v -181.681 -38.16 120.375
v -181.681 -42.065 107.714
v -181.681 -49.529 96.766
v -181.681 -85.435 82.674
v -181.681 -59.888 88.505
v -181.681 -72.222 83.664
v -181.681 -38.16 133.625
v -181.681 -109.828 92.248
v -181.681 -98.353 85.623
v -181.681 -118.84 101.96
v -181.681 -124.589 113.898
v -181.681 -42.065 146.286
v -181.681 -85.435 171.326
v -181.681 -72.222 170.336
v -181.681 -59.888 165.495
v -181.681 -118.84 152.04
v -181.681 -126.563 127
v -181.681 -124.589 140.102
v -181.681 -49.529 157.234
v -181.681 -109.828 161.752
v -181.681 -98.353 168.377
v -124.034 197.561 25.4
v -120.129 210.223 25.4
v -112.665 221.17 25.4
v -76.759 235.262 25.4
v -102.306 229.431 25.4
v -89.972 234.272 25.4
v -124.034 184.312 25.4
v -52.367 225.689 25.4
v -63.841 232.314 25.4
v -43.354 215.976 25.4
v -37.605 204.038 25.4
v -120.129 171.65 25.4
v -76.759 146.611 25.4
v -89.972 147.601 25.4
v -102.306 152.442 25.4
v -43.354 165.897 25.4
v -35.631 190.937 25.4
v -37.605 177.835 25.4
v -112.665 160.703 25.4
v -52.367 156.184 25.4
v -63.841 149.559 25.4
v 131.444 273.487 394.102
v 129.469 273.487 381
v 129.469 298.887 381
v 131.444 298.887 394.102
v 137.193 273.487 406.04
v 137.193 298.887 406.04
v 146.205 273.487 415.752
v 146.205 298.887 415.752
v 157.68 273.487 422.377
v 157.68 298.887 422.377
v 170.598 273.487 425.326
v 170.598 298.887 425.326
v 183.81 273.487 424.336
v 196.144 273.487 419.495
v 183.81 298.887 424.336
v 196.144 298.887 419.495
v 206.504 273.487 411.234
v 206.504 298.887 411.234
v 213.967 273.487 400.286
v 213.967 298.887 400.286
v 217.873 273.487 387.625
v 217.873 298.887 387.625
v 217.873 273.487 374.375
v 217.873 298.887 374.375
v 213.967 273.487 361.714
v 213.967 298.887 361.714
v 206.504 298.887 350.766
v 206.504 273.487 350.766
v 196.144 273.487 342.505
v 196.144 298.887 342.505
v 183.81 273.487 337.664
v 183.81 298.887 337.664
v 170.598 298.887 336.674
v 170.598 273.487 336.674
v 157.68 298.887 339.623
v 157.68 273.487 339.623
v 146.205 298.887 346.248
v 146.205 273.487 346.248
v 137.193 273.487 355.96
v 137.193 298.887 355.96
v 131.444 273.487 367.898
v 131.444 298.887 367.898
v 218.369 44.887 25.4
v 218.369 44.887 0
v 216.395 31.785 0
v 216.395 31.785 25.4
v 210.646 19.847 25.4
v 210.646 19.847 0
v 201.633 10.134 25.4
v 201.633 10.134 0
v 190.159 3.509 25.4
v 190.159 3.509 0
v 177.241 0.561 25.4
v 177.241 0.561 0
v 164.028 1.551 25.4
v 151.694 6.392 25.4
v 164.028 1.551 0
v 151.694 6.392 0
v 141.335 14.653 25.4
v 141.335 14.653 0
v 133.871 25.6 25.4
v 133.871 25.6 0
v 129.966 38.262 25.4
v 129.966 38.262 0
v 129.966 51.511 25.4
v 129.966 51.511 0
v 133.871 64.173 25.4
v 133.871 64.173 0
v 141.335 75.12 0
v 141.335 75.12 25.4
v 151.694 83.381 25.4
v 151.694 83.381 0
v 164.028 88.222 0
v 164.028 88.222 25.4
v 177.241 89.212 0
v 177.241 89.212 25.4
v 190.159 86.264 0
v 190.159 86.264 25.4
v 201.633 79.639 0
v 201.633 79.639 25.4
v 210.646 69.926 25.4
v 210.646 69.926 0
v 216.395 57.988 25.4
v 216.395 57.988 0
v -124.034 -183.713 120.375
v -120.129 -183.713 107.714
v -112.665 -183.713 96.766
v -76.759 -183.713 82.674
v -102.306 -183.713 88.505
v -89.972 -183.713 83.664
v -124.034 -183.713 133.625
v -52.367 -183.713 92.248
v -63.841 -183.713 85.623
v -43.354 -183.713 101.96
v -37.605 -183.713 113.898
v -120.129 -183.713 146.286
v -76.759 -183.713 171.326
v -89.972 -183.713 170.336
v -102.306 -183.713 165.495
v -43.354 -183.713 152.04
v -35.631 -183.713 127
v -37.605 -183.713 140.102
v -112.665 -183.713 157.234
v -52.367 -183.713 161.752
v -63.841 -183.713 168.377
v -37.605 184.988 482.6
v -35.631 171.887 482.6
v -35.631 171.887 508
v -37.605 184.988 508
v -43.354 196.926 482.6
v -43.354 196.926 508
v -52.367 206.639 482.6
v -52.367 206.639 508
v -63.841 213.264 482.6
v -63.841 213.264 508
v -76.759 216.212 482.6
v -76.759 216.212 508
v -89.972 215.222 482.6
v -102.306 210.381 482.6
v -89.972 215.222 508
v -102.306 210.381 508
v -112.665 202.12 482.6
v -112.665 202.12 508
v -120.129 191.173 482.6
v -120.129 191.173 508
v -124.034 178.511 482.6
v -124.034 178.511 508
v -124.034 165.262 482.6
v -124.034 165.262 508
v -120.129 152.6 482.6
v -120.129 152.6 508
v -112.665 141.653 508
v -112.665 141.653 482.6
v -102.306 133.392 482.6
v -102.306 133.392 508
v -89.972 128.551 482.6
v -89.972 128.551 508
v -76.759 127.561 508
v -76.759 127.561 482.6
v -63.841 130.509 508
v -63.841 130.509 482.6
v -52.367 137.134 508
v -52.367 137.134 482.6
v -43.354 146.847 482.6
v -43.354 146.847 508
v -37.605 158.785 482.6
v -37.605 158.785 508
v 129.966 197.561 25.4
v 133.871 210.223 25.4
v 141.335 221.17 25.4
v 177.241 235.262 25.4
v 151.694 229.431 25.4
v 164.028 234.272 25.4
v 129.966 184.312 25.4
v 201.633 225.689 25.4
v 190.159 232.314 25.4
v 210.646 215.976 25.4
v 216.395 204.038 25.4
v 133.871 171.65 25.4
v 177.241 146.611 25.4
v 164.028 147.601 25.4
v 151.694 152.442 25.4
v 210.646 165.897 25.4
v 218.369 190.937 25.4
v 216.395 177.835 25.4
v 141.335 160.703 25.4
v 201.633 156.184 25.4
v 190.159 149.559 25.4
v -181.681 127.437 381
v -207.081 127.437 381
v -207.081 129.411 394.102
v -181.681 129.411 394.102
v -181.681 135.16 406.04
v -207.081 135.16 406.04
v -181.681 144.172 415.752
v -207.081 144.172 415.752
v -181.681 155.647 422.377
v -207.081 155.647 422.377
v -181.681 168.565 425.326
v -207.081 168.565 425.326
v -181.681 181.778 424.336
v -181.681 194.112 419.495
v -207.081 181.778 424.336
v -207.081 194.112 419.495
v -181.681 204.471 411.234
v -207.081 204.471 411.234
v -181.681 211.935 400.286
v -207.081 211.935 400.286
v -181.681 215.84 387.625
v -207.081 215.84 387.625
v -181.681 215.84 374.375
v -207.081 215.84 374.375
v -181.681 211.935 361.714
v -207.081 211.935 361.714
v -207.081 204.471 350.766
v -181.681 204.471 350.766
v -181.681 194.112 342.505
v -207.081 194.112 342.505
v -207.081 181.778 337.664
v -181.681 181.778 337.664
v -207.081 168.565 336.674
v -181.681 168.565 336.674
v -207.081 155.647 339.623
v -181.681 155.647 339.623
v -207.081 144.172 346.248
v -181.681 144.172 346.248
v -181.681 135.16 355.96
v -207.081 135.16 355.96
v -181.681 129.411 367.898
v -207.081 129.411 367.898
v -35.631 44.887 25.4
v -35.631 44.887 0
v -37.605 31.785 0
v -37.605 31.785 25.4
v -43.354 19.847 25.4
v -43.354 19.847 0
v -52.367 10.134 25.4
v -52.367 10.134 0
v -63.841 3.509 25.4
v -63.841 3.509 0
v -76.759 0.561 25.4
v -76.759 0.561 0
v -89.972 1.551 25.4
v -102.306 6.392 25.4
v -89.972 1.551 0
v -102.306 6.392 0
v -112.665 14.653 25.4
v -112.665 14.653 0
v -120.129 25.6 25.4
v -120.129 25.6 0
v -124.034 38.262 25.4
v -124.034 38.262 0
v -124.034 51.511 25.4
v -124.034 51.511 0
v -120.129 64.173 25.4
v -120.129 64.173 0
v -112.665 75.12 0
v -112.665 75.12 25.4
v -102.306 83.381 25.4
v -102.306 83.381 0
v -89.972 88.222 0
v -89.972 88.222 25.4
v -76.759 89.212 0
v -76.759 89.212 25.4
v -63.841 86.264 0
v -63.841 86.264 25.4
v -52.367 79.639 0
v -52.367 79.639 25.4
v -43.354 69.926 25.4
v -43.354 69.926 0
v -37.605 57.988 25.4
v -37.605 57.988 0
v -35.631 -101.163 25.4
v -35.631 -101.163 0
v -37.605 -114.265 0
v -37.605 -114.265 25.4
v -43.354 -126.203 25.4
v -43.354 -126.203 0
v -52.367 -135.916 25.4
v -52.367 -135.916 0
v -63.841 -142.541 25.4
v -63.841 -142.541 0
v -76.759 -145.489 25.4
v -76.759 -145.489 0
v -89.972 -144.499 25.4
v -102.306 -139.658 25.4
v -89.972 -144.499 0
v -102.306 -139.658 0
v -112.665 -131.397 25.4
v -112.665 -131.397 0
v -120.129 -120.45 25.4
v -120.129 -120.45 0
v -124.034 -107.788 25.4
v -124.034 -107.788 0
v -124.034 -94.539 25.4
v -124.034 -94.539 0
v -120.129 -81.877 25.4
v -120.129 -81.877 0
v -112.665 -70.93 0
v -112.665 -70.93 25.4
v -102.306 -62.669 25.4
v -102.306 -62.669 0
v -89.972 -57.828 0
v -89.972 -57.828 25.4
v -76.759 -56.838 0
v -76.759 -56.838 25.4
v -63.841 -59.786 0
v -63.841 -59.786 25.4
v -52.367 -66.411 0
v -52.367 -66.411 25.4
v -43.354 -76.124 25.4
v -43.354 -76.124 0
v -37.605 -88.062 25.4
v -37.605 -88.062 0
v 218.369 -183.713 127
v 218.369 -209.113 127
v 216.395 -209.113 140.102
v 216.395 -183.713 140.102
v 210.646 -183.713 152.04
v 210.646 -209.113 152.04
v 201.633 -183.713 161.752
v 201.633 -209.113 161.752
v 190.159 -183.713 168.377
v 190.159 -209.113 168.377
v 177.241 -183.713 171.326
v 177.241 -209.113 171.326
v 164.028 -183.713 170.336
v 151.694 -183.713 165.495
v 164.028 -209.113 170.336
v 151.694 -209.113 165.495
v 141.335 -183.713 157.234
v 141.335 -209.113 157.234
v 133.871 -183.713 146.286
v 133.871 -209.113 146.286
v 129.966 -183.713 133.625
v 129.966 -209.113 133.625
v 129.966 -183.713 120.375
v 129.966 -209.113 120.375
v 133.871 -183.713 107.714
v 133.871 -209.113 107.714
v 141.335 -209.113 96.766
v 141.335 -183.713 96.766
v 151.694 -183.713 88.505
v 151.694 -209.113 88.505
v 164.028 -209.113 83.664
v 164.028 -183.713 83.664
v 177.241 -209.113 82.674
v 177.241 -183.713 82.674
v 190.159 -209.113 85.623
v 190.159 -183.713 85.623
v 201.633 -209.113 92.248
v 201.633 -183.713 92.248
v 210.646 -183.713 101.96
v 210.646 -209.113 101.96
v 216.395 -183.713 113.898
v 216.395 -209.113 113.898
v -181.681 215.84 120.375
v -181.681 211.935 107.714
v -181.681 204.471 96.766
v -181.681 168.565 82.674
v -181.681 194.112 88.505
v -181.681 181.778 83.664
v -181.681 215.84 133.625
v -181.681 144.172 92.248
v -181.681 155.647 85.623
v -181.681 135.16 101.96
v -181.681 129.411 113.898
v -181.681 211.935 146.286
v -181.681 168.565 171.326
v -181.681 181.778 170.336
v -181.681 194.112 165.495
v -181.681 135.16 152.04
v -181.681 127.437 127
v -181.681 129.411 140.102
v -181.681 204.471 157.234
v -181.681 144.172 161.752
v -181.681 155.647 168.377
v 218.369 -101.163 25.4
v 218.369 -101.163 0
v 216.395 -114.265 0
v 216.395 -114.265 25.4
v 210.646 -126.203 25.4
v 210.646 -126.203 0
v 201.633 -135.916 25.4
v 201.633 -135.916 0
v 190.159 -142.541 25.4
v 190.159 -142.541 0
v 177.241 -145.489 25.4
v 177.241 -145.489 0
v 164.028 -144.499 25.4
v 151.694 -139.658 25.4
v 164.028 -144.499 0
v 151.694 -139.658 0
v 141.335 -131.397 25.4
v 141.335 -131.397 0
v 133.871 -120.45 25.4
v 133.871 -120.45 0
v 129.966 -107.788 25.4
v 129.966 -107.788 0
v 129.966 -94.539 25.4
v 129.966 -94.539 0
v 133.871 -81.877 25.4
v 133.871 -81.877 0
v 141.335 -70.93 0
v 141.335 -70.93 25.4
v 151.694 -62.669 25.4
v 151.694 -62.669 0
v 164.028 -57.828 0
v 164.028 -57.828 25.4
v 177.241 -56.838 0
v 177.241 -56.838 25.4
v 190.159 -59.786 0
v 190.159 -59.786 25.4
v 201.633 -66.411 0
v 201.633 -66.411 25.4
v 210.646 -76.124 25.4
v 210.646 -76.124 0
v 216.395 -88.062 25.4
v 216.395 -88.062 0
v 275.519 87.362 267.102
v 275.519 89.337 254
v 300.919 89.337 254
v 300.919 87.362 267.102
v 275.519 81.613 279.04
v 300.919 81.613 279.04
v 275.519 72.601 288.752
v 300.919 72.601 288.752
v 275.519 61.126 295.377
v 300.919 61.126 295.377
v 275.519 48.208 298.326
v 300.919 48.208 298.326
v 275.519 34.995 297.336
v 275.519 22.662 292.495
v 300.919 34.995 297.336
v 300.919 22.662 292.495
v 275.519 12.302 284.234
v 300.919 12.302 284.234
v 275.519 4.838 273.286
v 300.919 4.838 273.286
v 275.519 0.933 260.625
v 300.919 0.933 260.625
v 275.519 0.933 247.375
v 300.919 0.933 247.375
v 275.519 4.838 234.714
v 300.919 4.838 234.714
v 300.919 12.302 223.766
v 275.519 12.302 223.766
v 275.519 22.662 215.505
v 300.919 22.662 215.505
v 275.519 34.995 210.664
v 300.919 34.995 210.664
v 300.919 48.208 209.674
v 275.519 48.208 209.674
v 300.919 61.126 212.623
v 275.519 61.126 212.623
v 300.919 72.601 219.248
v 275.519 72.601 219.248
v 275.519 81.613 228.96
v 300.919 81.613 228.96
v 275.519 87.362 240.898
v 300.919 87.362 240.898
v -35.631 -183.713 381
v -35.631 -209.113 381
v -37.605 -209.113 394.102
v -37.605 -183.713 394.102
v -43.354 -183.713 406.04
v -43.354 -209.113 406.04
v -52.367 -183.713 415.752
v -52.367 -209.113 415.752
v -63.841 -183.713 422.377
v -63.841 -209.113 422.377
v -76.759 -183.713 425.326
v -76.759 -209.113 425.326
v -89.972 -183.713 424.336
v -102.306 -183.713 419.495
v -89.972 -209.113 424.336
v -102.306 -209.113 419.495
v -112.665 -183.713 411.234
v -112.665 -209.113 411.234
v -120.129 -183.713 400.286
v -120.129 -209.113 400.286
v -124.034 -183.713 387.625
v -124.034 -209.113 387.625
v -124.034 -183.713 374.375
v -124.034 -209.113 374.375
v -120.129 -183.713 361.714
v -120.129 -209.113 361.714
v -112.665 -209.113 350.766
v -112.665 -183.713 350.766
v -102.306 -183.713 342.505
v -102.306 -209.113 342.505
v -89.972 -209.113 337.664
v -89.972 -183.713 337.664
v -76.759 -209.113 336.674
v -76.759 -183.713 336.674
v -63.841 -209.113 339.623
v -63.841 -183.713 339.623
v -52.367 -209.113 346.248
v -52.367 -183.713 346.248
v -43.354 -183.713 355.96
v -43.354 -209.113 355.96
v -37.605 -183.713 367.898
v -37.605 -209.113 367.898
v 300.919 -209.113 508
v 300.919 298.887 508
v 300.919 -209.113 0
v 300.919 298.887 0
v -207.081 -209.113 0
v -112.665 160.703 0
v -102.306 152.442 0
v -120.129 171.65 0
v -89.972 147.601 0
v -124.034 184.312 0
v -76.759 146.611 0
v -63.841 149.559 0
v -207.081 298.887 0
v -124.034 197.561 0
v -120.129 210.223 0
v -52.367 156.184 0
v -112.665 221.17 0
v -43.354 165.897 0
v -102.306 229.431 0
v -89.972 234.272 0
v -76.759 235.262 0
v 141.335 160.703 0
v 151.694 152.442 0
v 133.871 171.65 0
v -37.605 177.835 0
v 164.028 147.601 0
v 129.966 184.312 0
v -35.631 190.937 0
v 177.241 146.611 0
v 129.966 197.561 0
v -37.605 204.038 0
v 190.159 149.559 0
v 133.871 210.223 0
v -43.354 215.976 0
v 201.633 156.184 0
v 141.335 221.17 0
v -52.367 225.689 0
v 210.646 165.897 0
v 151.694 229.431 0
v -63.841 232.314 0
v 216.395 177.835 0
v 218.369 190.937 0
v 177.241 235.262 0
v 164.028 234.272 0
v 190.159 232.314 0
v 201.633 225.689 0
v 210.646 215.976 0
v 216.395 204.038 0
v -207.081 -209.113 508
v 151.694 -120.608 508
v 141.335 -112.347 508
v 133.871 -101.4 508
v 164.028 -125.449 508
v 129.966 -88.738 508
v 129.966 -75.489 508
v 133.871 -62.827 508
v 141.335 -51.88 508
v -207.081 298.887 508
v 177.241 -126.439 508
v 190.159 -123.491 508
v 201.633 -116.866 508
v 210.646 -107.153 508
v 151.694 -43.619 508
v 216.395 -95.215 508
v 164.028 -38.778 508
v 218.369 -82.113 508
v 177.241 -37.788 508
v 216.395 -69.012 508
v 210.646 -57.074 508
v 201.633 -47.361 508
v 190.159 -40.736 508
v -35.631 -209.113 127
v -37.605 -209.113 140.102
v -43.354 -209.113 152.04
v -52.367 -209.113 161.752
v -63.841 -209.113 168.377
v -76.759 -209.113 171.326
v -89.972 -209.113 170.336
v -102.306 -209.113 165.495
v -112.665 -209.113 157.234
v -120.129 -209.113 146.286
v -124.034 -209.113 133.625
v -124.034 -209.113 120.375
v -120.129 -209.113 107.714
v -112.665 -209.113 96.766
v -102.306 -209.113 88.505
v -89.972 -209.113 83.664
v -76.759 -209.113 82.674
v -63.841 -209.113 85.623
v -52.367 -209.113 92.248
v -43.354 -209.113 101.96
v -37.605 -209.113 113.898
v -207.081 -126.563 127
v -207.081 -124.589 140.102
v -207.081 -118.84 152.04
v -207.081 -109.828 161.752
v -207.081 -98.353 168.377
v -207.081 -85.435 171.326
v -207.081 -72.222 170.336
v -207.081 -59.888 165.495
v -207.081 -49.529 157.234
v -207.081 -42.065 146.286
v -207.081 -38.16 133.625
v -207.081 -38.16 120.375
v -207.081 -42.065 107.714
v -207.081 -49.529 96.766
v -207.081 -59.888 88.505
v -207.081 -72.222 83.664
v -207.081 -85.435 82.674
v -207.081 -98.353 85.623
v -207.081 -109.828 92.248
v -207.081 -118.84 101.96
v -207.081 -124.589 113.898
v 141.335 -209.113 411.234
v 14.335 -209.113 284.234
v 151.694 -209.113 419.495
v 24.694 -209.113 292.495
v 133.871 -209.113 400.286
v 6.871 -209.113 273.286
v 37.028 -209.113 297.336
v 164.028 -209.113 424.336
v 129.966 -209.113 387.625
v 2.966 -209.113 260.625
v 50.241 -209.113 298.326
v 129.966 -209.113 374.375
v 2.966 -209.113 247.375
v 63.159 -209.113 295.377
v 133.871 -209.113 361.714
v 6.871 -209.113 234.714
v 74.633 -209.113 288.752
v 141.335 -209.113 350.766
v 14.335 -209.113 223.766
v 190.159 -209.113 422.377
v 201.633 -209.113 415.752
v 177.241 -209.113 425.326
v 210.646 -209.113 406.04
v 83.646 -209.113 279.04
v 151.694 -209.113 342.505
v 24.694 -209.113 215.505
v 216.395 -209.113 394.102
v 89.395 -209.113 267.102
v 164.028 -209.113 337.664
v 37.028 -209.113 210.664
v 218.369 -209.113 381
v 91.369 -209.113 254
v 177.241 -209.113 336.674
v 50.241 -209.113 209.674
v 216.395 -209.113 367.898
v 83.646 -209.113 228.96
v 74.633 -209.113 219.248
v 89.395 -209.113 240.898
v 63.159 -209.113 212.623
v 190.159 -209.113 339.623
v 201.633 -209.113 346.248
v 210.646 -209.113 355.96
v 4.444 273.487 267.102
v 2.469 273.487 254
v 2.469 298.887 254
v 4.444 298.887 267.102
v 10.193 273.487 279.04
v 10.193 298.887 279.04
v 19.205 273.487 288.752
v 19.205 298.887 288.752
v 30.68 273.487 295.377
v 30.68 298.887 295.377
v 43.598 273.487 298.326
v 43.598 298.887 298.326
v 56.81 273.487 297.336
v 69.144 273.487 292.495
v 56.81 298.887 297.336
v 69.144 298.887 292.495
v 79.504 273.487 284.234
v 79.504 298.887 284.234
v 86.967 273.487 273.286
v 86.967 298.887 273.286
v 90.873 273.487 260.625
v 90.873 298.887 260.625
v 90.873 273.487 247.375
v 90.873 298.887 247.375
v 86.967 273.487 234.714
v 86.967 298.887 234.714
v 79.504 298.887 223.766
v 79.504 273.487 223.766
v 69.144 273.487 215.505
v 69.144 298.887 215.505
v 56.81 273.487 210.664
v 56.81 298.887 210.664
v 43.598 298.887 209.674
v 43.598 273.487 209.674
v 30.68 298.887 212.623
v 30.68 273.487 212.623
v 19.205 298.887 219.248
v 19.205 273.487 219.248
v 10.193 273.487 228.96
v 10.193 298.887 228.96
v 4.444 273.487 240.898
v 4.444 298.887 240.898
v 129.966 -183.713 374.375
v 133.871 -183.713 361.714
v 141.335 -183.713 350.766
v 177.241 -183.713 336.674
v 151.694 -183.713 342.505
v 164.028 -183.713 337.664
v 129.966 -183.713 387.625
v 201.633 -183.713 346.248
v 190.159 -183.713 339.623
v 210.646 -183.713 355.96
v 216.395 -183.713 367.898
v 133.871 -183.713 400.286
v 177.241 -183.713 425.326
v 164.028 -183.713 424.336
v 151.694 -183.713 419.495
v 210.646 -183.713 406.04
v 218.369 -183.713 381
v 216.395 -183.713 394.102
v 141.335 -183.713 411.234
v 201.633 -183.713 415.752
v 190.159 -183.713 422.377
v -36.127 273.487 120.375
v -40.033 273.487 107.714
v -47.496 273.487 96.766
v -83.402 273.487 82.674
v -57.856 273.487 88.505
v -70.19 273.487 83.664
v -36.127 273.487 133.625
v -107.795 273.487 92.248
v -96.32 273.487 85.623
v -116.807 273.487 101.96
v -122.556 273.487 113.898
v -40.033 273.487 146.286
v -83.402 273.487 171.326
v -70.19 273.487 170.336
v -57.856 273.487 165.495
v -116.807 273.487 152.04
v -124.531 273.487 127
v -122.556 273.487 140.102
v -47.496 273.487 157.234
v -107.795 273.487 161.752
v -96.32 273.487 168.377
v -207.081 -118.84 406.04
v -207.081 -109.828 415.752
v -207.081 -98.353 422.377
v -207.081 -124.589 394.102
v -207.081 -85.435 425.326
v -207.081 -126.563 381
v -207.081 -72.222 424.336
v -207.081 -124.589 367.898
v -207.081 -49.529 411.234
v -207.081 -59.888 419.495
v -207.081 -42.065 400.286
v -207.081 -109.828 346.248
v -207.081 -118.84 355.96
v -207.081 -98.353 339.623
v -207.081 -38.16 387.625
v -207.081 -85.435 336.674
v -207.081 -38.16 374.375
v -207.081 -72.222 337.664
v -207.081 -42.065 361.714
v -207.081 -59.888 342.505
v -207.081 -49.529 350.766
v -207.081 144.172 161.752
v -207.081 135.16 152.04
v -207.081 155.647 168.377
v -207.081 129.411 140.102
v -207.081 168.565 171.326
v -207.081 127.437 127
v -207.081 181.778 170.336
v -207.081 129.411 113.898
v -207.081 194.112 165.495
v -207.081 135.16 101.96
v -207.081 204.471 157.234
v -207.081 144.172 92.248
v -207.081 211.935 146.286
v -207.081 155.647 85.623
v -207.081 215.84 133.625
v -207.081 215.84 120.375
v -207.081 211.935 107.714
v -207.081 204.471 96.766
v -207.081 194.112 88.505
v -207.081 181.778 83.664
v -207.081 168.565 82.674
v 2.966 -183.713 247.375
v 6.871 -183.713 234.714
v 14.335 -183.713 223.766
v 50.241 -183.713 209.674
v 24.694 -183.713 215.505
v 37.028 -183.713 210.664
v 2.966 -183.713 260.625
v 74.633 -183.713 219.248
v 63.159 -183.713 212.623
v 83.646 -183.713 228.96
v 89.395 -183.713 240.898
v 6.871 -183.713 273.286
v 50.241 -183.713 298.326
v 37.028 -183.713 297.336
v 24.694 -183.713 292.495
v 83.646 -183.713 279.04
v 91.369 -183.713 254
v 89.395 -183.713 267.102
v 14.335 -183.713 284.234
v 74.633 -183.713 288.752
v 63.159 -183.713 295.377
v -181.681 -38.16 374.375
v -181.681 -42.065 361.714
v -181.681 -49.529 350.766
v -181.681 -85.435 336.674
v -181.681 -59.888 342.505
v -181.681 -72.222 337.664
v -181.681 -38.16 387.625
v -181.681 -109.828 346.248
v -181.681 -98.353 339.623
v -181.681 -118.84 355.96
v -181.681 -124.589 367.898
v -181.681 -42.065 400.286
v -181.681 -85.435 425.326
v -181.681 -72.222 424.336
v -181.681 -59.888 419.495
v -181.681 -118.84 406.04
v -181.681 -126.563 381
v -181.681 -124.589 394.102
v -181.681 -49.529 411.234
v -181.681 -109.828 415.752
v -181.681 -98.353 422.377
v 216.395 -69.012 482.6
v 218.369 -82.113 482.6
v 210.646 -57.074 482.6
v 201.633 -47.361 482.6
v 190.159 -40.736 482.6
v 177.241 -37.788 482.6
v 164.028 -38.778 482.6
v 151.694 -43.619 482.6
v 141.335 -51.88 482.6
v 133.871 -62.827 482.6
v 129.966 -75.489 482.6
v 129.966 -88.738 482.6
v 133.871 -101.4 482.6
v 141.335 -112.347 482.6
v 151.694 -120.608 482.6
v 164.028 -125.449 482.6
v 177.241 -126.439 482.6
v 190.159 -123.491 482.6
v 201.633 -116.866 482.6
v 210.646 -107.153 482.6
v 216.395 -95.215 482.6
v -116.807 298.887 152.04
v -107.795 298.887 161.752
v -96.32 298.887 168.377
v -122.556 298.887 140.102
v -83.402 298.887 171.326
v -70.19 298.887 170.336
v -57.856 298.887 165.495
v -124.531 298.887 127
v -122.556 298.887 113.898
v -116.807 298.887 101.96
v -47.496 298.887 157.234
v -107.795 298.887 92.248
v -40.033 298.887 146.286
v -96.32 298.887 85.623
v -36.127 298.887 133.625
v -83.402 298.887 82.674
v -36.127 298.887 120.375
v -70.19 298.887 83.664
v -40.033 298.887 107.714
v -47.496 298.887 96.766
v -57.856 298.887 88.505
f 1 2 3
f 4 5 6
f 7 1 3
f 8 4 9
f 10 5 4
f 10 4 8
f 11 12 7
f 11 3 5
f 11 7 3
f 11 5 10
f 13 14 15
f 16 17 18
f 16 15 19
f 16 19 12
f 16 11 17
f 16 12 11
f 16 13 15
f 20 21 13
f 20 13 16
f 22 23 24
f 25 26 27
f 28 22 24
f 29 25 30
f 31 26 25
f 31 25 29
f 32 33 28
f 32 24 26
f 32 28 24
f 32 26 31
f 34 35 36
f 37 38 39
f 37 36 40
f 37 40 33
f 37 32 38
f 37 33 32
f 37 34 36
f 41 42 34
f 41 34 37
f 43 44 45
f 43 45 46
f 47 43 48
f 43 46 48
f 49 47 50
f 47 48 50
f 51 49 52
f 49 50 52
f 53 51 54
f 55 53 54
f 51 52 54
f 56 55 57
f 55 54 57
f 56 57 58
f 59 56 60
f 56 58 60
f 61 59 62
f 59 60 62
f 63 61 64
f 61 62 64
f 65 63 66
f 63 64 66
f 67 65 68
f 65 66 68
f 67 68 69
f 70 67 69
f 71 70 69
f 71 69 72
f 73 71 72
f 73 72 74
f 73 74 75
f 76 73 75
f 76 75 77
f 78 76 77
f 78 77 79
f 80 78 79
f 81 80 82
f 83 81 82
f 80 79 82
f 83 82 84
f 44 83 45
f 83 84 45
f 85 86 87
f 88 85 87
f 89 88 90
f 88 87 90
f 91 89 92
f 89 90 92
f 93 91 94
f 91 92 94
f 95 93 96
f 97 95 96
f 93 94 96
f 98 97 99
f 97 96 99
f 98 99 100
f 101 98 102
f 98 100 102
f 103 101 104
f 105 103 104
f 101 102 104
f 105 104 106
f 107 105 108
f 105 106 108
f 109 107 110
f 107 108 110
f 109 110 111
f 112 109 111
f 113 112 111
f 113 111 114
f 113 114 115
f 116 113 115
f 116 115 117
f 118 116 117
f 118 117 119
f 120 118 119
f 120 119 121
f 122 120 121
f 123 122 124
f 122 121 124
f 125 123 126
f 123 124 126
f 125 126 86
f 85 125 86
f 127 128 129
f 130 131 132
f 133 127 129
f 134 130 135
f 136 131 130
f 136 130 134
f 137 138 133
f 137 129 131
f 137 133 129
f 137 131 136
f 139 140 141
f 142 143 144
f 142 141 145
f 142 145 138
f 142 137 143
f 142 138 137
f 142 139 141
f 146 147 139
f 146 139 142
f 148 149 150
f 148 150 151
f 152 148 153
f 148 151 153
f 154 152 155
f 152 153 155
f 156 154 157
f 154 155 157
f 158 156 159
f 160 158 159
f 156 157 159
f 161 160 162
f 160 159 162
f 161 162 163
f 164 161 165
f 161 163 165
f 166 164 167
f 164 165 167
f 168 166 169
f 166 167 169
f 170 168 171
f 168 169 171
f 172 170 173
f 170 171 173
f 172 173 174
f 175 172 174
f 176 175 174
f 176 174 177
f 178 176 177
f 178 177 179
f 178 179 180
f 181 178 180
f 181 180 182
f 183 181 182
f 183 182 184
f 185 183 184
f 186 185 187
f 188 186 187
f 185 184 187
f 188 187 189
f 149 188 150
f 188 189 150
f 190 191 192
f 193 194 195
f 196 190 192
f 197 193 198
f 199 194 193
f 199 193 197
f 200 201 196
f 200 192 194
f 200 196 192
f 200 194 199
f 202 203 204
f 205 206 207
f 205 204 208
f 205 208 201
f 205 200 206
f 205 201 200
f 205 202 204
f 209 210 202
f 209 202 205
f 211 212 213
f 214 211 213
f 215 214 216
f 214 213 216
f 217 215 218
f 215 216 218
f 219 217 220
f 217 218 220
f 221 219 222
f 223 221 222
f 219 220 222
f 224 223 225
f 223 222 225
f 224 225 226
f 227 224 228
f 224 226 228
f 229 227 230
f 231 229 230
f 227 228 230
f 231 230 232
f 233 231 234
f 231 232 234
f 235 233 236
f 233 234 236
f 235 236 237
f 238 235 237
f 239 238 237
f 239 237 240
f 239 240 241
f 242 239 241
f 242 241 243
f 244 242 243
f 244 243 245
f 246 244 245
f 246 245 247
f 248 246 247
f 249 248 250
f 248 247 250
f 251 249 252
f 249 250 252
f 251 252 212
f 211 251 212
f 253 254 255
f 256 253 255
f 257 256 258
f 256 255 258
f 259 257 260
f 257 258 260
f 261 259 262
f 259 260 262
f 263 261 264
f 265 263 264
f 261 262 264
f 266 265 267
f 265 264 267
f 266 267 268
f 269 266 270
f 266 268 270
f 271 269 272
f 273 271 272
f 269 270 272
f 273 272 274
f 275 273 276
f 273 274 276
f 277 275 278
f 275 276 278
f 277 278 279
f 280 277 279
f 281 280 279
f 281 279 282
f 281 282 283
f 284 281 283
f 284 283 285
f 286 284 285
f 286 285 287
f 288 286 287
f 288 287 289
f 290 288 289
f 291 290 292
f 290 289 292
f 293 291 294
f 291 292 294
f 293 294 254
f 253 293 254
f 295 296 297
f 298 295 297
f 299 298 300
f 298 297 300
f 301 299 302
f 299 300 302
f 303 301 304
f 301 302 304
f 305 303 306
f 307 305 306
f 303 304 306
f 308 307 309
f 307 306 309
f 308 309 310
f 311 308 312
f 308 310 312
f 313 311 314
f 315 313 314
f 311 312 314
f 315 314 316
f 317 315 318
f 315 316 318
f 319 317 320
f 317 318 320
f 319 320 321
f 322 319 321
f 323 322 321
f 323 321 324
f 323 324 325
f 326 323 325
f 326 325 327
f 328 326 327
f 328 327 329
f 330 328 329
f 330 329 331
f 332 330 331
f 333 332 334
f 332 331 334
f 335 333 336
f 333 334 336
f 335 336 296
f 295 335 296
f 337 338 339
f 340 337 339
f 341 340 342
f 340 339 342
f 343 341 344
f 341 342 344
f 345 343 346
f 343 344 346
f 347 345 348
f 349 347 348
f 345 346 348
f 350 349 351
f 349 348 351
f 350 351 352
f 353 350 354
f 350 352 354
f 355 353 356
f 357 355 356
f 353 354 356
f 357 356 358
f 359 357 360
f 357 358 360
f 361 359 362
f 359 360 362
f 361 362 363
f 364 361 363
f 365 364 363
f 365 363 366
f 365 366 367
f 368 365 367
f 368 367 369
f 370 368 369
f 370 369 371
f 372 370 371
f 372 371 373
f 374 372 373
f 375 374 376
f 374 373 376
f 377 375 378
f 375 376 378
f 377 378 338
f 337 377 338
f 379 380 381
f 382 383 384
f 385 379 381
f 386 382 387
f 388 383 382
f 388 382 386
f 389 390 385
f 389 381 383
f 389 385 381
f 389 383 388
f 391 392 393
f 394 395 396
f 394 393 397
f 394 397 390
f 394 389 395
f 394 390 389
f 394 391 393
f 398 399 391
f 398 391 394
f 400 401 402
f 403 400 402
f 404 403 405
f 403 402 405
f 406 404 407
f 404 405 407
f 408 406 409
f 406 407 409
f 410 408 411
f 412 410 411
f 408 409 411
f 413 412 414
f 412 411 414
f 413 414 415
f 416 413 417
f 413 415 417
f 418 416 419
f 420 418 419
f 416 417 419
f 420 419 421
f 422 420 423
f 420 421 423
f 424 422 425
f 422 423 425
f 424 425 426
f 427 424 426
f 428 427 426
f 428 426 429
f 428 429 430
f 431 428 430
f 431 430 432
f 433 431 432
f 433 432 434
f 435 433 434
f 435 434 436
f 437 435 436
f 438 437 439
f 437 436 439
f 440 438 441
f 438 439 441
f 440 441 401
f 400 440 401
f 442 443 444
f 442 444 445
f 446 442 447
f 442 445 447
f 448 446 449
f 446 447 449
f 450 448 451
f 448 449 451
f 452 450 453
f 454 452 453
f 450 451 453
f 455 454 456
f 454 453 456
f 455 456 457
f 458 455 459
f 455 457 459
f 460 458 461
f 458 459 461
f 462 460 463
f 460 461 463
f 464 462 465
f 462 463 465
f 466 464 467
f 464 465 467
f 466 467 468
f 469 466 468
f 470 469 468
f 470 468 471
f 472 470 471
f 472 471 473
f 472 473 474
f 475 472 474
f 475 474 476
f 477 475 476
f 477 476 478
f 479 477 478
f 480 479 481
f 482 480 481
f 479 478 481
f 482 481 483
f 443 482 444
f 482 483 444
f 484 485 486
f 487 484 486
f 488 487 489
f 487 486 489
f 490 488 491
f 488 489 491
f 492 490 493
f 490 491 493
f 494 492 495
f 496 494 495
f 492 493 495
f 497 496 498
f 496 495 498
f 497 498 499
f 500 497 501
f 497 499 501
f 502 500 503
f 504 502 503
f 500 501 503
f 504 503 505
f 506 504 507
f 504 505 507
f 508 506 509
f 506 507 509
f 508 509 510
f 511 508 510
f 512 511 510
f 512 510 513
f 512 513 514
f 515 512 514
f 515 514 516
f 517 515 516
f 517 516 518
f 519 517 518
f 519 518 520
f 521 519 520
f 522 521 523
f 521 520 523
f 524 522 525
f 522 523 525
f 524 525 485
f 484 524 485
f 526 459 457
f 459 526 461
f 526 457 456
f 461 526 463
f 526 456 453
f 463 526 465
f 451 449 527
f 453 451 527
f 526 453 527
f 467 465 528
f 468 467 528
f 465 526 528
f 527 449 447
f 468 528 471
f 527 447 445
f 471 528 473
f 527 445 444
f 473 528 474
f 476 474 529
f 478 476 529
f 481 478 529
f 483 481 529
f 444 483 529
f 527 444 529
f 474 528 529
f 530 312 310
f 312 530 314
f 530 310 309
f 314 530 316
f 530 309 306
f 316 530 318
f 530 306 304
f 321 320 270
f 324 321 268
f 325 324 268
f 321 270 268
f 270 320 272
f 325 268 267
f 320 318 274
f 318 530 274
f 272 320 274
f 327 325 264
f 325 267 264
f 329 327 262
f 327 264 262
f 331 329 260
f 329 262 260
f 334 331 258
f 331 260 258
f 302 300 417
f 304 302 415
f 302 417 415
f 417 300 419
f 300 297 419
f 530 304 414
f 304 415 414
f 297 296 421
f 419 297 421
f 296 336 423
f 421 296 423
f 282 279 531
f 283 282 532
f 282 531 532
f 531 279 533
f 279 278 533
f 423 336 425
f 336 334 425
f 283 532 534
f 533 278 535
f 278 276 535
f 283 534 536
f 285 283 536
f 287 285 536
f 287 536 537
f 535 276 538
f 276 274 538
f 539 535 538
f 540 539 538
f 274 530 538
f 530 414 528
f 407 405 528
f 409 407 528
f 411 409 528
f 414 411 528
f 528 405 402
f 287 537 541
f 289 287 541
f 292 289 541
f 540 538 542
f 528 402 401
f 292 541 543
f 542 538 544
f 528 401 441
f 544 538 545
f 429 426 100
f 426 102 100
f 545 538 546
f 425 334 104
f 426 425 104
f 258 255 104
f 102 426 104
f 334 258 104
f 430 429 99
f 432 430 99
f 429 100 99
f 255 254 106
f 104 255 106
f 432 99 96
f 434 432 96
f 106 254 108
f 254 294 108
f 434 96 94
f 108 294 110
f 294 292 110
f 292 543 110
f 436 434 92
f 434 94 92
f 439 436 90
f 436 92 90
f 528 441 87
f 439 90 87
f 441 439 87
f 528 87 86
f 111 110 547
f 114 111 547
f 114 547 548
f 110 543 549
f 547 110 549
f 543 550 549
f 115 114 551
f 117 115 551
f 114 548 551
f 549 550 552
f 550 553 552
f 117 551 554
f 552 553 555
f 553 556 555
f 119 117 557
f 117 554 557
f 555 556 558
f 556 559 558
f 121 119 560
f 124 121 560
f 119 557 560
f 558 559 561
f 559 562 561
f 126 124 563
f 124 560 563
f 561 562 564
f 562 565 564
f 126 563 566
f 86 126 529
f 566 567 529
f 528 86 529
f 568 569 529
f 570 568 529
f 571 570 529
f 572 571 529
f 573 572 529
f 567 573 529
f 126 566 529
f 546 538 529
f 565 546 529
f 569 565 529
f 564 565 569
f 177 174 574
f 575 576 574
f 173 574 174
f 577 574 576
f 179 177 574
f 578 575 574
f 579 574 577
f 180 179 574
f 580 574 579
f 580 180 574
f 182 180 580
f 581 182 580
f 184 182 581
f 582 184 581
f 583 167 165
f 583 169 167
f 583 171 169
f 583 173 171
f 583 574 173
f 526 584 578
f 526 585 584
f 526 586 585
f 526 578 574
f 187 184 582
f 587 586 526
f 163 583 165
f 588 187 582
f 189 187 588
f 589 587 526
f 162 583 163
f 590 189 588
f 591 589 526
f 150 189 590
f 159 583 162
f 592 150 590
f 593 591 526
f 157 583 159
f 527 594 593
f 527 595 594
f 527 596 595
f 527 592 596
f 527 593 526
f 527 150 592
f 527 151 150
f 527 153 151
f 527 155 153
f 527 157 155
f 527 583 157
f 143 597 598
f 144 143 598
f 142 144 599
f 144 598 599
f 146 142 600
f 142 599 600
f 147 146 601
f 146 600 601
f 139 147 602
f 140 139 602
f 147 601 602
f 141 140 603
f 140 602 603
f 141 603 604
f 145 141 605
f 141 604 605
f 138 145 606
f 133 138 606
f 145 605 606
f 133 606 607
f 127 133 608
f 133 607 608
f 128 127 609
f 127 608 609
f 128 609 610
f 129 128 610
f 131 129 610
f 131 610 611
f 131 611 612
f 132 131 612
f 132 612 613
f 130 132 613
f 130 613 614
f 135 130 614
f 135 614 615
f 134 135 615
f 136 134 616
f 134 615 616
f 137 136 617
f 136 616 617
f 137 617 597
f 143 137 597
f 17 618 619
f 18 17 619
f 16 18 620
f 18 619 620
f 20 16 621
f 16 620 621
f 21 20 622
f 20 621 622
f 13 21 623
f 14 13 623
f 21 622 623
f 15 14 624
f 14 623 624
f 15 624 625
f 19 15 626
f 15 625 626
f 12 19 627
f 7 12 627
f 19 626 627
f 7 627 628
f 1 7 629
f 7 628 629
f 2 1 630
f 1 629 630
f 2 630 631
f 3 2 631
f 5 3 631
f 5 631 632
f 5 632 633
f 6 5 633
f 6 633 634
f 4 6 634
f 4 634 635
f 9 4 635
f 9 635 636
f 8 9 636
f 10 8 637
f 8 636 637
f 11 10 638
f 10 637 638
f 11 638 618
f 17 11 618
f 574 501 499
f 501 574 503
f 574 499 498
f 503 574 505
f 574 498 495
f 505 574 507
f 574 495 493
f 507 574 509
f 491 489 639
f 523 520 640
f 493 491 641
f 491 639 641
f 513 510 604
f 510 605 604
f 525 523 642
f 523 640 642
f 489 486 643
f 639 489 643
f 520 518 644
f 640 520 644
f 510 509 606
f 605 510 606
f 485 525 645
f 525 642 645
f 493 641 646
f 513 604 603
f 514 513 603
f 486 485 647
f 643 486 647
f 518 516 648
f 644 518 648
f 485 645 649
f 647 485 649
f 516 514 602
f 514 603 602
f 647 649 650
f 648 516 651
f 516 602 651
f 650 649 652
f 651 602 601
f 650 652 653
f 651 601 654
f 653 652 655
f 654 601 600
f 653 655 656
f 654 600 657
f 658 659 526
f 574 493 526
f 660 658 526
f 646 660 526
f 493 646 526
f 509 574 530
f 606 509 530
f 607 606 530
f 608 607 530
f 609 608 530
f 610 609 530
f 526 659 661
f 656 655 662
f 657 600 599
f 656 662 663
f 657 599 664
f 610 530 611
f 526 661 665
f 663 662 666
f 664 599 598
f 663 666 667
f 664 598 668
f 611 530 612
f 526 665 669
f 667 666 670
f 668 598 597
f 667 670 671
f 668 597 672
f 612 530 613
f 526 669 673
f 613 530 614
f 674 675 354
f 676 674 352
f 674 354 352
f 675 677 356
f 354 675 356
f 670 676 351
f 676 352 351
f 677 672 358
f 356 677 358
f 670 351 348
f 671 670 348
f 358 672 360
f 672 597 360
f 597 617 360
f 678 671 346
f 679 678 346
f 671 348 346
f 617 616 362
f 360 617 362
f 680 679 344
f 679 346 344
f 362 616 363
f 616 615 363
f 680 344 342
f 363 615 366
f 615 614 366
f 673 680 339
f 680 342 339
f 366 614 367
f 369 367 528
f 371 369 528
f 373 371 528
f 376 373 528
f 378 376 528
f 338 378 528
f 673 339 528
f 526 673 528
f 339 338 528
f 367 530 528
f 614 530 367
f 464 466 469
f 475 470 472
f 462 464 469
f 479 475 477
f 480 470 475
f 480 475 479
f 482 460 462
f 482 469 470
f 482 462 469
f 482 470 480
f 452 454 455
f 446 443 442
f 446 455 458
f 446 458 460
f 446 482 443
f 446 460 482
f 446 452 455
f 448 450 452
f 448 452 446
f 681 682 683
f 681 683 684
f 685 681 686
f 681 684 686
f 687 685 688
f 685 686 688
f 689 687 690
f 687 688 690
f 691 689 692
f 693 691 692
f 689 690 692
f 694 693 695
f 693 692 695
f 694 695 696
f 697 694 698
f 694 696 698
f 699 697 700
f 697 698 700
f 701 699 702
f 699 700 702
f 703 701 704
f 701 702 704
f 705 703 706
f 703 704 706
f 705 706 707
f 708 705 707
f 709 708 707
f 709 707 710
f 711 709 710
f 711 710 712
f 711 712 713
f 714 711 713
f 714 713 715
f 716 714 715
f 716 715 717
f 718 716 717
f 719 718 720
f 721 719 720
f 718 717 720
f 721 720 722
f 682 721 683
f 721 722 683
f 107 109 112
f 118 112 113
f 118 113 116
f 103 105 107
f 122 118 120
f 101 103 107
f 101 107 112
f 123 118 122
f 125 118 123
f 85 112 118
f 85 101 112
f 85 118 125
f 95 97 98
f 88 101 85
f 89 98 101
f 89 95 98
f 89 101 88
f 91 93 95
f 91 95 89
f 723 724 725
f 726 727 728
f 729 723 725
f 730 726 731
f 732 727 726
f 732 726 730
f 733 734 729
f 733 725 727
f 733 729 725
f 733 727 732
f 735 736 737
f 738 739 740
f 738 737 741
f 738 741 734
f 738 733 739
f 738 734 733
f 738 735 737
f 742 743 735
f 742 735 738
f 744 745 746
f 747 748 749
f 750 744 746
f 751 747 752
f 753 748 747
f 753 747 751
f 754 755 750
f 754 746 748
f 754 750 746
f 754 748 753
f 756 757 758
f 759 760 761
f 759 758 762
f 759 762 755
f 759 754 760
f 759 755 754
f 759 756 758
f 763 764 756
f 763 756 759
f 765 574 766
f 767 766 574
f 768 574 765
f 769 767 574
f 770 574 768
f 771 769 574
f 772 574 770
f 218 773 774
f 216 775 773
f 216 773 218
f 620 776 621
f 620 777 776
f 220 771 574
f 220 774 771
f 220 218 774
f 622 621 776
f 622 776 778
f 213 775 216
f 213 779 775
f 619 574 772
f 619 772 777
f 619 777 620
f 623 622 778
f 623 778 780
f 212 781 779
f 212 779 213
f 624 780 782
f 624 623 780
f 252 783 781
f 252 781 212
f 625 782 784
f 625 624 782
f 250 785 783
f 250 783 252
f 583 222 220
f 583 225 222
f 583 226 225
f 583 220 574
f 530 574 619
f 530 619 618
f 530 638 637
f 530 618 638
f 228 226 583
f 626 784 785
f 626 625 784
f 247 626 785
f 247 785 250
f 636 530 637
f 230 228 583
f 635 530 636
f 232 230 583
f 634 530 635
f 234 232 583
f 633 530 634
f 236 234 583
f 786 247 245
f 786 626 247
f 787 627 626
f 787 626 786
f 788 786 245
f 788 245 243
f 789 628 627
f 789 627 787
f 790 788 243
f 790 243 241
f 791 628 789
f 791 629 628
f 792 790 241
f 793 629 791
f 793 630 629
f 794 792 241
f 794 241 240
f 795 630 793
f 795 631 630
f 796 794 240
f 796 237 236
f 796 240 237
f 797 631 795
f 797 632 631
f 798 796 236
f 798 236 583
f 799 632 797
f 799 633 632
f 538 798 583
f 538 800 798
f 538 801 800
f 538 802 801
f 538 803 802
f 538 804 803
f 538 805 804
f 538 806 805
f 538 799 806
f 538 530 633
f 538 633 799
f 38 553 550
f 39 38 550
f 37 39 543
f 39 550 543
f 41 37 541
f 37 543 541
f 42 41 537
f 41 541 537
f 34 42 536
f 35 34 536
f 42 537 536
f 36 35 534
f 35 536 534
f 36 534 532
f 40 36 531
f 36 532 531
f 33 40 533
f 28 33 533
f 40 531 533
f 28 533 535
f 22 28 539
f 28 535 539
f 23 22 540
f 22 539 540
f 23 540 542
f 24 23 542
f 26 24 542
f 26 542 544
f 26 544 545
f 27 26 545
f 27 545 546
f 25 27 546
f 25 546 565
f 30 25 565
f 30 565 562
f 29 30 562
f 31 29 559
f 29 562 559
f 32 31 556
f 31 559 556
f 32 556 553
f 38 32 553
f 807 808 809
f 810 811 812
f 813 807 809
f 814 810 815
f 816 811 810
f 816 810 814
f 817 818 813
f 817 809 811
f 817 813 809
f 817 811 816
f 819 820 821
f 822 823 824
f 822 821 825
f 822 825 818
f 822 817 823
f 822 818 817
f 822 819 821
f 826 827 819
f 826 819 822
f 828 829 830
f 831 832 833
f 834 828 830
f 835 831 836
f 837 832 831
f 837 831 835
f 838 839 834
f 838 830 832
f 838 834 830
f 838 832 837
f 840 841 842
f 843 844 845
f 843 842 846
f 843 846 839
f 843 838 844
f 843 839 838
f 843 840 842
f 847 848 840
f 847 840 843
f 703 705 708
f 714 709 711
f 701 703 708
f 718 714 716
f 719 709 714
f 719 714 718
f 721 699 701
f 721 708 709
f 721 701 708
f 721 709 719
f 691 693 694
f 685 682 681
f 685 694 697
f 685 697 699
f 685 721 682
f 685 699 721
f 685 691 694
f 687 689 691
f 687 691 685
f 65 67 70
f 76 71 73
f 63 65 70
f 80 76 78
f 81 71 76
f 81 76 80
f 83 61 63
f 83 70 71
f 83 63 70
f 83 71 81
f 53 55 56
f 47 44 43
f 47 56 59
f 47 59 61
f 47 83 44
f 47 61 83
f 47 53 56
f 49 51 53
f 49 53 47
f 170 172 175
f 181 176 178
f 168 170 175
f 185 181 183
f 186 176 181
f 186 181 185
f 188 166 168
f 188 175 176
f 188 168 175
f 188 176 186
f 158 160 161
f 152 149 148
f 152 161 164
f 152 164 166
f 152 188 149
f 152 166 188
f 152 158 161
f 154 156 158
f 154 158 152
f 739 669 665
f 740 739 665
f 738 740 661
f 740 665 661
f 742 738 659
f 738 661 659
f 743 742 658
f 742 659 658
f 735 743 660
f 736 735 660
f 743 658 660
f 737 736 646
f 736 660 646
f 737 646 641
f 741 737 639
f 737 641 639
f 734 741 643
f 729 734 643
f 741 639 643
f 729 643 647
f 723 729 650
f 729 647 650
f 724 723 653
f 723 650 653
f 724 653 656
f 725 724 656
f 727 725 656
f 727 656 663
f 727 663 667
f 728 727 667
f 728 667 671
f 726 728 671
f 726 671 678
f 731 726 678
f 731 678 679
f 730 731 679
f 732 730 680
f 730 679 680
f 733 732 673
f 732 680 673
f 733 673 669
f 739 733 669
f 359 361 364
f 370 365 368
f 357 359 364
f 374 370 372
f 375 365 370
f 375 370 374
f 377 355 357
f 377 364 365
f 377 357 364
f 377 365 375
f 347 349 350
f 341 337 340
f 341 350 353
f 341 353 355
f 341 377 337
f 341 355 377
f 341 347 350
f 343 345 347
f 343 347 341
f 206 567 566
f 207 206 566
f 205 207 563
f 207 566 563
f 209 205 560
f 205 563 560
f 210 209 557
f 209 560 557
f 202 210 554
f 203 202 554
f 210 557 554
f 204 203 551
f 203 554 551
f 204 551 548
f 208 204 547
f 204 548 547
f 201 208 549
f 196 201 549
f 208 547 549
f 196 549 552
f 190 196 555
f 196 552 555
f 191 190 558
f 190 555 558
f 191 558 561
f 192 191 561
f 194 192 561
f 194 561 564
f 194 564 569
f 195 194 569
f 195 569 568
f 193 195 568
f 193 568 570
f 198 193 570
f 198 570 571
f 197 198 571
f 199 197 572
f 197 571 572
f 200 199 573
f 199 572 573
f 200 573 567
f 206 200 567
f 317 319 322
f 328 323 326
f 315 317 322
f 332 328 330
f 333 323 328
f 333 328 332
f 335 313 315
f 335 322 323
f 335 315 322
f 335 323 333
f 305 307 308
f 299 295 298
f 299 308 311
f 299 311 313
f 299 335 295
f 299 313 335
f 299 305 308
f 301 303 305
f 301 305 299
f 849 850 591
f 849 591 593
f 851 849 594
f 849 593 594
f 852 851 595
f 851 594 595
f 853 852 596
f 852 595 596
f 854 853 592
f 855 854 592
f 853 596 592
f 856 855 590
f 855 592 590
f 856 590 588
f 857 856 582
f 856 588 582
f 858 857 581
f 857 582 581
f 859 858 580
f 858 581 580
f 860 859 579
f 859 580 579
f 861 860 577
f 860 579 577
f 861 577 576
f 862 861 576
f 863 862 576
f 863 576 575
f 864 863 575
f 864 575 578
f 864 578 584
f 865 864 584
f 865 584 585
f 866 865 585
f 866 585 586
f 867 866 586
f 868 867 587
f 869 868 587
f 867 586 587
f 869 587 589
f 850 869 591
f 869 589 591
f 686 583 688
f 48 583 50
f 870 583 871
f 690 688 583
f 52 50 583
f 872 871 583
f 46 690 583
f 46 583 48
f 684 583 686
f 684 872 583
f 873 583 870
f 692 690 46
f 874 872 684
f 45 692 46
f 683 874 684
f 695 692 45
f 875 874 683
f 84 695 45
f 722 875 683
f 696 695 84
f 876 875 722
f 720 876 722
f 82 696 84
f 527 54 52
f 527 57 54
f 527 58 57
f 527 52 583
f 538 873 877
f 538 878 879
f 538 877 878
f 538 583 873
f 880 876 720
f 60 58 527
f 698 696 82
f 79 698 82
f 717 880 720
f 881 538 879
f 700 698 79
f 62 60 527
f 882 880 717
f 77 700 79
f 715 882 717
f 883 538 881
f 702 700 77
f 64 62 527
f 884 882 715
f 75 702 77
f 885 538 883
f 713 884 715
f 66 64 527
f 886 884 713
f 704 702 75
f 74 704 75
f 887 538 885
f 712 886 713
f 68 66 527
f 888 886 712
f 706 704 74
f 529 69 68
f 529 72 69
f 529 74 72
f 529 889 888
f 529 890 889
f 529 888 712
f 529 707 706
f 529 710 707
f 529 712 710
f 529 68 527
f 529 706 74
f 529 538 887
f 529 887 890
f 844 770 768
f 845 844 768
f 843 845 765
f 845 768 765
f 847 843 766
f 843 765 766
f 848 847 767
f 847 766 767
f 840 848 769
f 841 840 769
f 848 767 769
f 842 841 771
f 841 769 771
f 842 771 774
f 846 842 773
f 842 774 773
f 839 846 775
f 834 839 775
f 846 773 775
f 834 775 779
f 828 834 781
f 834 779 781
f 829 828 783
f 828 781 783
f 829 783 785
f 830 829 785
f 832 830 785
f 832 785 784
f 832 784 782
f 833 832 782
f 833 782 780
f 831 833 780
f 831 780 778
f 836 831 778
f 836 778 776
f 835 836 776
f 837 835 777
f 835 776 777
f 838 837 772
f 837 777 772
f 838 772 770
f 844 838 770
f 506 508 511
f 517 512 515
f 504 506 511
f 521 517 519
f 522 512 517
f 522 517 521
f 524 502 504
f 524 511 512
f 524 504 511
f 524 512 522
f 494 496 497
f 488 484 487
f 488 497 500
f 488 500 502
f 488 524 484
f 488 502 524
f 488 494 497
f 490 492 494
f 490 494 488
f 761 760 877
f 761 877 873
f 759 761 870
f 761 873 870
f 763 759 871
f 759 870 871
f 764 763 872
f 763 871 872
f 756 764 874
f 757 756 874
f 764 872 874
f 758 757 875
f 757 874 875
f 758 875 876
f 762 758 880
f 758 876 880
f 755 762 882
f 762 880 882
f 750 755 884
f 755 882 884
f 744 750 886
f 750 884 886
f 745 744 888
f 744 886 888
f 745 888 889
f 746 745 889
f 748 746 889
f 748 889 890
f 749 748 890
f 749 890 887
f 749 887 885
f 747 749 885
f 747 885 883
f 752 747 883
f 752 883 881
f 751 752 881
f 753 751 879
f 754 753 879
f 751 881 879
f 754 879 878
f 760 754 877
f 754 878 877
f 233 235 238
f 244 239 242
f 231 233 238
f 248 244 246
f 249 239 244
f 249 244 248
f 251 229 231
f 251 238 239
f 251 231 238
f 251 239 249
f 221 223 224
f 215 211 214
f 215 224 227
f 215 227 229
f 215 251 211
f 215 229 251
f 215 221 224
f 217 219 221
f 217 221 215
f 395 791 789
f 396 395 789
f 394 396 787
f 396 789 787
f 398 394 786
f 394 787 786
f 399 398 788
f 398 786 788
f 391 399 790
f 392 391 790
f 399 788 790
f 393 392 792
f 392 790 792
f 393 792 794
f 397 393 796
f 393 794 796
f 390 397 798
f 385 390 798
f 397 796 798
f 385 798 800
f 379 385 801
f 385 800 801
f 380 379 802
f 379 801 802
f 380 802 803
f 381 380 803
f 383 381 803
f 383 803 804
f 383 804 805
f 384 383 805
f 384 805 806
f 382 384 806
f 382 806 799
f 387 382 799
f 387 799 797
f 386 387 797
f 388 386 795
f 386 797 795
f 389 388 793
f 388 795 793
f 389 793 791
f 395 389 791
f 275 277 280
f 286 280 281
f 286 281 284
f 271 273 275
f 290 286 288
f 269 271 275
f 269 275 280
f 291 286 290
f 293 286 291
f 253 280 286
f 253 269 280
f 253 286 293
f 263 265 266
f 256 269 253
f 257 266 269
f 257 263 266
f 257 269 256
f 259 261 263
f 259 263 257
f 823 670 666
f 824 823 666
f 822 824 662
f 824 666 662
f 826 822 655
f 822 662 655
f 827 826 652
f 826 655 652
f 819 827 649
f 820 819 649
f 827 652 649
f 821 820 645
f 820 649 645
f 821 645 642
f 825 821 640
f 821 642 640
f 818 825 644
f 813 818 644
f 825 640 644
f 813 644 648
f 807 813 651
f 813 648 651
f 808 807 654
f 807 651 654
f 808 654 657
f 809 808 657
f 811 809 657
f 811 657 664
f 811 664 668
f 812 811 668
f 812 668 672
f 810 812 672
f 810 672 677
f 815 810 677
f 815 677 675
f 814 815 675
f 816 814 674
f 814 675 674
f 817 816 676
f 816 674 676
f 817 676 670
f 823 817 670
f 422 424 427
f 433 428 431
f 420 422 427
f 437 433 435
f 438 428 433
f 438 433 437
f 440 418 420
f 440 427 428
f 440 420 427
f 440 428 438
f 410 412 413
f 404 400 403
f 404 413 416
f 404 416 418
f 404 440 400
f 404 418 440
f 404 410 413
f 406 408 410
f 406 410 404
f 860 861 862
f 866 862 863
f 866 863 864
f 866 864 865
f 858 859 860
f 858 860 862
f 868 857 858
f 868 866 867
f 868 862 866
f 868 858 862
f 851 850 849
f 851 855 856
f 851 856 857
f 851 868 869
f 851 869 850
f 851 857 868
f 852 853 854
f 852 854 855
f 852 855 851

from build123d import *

# Parameters (mm, degrees)
F0_W      = 508
F0_H      = 508
F1_DEPTH  = 508
F2_R      = 44.45
F3_DEPTH  = 25.4
F4_R      = 44.45
F5_DEPTH  = 25.4
F6_R      = 44.45
F7_DEPTH  = 25.4
F8_R      = 44.45
F9_DEPTH  = 25.4
F10_R     = 44.45
F11_DEPTH = 25.4
F12_R     = 44.45
F13_DEPTH = 25.4


with BuildPart() as f1:
    # F0 (on Top) → F1 (new body)
    with BuildSketch(Plane.XY):
        with Locations((46.919354, 44.886551)):
            Rectangle(F0_W, F0_H)
    extrude(amount=F1_DEPTH)

    # F2 (on face) → F3 (cut)
    with BuildSketch(Plane(origin=(-207.080646, 0, 0), x_dir=(0, -1, 0), z_dir=(-1, 0, 0))):
        with Locations((-171.886551, 127)):
            Circle(F2_R)
        with Locations((-171.886551, 381)):
            Circle(F2_R)
        with Locations((82.113449, 381)):
            Circle(F2_R)
        with Locations((82.113449, 127)):
            Circle(F2_R)
    extrude(amount=-F3_DEPTH, mode=Mode.SUBTRACT)

    # F4 (on face) → F5 (cut)
    with BuildSketch(Plane(origin=(0, 0, 0), x_dir=(1, 0, 0), z_dir=(0, 0, -1))):
        with Locations((-80.080646, 101.163449)):
            Circle(F4_R)
        with Locations((-80.080646, -190.936551)):
            Circle(F4_R)
        with Locations((173.919354, 101.163449)):
            Circle(F4_R)
        with Locations((-80.080646, -44.886551)):
            Circle(F4_R)
        with Locations((173.919354, -44.886551)):
            Circle(F4_R)
        with Locations((173.919354, -190.936551)):
            Circle(F4_R)
    extrude(amount=-F5_DEPTH, mode=Mode.SUBTRACT)

    # F6 (on face) → F7 (cut)
    with BuildSketch(Plane(origin=(0, 298.886551, 0), x_dir=(-1, 0, 0), z_dir=(0, 1, 0))):
        with Locations((80.080646, 127)):
            Circle(F6_R)
        with Locations((-173.919354, 381)):
            Circle(F6_R)
        with Locations((-46.919354, 254)):
            Circle(F6_R)
    extrude(amount=-F7_DEPTH, mode=Mode.SUBTRACT)

    # F8 (on face) → F9 (cut)
    with BuildSketch(Plane.XZ.offset(209.113449)):
        with Locations((-80.080646, 127)):
            Circle(F8_R)
        with Locations((-80.080646, 381)):
            Circle(F8_R)
        with Locations((46.919354, 254)):
            Circle(F8_R)
        with Locations((173.919354, 127)):
            Circle(F8_R)
        with Locations((173.919354, 381)):
            Circle(F8_R)
    extrude(amount=-F9_DEPTH, mode=Mode.SUBTRACT)

    # F10 (on face) → F11 (cut)
    with BuildSketch(Plane.YZ.offset(300.919354)):
        with Locations((44.886551, 254)):
            Circle(F10_R)
    extrude(amount=-F11_DEPTH, mode=Mode.SUBTRACT)

    # F12 (on face) → F13 (cut)
    with BuildSketch(Plane.XY.offset(508)):
        with Locations((173.919354, -82.113449)):
            Circle(F12_R)
        with Locations((-80.080646, 171.886551)):
            Circle(F12_R)
    extrude(amount=-F13_DEPTH, mode=Mode.SUBTRACT)


solid = f1.part
